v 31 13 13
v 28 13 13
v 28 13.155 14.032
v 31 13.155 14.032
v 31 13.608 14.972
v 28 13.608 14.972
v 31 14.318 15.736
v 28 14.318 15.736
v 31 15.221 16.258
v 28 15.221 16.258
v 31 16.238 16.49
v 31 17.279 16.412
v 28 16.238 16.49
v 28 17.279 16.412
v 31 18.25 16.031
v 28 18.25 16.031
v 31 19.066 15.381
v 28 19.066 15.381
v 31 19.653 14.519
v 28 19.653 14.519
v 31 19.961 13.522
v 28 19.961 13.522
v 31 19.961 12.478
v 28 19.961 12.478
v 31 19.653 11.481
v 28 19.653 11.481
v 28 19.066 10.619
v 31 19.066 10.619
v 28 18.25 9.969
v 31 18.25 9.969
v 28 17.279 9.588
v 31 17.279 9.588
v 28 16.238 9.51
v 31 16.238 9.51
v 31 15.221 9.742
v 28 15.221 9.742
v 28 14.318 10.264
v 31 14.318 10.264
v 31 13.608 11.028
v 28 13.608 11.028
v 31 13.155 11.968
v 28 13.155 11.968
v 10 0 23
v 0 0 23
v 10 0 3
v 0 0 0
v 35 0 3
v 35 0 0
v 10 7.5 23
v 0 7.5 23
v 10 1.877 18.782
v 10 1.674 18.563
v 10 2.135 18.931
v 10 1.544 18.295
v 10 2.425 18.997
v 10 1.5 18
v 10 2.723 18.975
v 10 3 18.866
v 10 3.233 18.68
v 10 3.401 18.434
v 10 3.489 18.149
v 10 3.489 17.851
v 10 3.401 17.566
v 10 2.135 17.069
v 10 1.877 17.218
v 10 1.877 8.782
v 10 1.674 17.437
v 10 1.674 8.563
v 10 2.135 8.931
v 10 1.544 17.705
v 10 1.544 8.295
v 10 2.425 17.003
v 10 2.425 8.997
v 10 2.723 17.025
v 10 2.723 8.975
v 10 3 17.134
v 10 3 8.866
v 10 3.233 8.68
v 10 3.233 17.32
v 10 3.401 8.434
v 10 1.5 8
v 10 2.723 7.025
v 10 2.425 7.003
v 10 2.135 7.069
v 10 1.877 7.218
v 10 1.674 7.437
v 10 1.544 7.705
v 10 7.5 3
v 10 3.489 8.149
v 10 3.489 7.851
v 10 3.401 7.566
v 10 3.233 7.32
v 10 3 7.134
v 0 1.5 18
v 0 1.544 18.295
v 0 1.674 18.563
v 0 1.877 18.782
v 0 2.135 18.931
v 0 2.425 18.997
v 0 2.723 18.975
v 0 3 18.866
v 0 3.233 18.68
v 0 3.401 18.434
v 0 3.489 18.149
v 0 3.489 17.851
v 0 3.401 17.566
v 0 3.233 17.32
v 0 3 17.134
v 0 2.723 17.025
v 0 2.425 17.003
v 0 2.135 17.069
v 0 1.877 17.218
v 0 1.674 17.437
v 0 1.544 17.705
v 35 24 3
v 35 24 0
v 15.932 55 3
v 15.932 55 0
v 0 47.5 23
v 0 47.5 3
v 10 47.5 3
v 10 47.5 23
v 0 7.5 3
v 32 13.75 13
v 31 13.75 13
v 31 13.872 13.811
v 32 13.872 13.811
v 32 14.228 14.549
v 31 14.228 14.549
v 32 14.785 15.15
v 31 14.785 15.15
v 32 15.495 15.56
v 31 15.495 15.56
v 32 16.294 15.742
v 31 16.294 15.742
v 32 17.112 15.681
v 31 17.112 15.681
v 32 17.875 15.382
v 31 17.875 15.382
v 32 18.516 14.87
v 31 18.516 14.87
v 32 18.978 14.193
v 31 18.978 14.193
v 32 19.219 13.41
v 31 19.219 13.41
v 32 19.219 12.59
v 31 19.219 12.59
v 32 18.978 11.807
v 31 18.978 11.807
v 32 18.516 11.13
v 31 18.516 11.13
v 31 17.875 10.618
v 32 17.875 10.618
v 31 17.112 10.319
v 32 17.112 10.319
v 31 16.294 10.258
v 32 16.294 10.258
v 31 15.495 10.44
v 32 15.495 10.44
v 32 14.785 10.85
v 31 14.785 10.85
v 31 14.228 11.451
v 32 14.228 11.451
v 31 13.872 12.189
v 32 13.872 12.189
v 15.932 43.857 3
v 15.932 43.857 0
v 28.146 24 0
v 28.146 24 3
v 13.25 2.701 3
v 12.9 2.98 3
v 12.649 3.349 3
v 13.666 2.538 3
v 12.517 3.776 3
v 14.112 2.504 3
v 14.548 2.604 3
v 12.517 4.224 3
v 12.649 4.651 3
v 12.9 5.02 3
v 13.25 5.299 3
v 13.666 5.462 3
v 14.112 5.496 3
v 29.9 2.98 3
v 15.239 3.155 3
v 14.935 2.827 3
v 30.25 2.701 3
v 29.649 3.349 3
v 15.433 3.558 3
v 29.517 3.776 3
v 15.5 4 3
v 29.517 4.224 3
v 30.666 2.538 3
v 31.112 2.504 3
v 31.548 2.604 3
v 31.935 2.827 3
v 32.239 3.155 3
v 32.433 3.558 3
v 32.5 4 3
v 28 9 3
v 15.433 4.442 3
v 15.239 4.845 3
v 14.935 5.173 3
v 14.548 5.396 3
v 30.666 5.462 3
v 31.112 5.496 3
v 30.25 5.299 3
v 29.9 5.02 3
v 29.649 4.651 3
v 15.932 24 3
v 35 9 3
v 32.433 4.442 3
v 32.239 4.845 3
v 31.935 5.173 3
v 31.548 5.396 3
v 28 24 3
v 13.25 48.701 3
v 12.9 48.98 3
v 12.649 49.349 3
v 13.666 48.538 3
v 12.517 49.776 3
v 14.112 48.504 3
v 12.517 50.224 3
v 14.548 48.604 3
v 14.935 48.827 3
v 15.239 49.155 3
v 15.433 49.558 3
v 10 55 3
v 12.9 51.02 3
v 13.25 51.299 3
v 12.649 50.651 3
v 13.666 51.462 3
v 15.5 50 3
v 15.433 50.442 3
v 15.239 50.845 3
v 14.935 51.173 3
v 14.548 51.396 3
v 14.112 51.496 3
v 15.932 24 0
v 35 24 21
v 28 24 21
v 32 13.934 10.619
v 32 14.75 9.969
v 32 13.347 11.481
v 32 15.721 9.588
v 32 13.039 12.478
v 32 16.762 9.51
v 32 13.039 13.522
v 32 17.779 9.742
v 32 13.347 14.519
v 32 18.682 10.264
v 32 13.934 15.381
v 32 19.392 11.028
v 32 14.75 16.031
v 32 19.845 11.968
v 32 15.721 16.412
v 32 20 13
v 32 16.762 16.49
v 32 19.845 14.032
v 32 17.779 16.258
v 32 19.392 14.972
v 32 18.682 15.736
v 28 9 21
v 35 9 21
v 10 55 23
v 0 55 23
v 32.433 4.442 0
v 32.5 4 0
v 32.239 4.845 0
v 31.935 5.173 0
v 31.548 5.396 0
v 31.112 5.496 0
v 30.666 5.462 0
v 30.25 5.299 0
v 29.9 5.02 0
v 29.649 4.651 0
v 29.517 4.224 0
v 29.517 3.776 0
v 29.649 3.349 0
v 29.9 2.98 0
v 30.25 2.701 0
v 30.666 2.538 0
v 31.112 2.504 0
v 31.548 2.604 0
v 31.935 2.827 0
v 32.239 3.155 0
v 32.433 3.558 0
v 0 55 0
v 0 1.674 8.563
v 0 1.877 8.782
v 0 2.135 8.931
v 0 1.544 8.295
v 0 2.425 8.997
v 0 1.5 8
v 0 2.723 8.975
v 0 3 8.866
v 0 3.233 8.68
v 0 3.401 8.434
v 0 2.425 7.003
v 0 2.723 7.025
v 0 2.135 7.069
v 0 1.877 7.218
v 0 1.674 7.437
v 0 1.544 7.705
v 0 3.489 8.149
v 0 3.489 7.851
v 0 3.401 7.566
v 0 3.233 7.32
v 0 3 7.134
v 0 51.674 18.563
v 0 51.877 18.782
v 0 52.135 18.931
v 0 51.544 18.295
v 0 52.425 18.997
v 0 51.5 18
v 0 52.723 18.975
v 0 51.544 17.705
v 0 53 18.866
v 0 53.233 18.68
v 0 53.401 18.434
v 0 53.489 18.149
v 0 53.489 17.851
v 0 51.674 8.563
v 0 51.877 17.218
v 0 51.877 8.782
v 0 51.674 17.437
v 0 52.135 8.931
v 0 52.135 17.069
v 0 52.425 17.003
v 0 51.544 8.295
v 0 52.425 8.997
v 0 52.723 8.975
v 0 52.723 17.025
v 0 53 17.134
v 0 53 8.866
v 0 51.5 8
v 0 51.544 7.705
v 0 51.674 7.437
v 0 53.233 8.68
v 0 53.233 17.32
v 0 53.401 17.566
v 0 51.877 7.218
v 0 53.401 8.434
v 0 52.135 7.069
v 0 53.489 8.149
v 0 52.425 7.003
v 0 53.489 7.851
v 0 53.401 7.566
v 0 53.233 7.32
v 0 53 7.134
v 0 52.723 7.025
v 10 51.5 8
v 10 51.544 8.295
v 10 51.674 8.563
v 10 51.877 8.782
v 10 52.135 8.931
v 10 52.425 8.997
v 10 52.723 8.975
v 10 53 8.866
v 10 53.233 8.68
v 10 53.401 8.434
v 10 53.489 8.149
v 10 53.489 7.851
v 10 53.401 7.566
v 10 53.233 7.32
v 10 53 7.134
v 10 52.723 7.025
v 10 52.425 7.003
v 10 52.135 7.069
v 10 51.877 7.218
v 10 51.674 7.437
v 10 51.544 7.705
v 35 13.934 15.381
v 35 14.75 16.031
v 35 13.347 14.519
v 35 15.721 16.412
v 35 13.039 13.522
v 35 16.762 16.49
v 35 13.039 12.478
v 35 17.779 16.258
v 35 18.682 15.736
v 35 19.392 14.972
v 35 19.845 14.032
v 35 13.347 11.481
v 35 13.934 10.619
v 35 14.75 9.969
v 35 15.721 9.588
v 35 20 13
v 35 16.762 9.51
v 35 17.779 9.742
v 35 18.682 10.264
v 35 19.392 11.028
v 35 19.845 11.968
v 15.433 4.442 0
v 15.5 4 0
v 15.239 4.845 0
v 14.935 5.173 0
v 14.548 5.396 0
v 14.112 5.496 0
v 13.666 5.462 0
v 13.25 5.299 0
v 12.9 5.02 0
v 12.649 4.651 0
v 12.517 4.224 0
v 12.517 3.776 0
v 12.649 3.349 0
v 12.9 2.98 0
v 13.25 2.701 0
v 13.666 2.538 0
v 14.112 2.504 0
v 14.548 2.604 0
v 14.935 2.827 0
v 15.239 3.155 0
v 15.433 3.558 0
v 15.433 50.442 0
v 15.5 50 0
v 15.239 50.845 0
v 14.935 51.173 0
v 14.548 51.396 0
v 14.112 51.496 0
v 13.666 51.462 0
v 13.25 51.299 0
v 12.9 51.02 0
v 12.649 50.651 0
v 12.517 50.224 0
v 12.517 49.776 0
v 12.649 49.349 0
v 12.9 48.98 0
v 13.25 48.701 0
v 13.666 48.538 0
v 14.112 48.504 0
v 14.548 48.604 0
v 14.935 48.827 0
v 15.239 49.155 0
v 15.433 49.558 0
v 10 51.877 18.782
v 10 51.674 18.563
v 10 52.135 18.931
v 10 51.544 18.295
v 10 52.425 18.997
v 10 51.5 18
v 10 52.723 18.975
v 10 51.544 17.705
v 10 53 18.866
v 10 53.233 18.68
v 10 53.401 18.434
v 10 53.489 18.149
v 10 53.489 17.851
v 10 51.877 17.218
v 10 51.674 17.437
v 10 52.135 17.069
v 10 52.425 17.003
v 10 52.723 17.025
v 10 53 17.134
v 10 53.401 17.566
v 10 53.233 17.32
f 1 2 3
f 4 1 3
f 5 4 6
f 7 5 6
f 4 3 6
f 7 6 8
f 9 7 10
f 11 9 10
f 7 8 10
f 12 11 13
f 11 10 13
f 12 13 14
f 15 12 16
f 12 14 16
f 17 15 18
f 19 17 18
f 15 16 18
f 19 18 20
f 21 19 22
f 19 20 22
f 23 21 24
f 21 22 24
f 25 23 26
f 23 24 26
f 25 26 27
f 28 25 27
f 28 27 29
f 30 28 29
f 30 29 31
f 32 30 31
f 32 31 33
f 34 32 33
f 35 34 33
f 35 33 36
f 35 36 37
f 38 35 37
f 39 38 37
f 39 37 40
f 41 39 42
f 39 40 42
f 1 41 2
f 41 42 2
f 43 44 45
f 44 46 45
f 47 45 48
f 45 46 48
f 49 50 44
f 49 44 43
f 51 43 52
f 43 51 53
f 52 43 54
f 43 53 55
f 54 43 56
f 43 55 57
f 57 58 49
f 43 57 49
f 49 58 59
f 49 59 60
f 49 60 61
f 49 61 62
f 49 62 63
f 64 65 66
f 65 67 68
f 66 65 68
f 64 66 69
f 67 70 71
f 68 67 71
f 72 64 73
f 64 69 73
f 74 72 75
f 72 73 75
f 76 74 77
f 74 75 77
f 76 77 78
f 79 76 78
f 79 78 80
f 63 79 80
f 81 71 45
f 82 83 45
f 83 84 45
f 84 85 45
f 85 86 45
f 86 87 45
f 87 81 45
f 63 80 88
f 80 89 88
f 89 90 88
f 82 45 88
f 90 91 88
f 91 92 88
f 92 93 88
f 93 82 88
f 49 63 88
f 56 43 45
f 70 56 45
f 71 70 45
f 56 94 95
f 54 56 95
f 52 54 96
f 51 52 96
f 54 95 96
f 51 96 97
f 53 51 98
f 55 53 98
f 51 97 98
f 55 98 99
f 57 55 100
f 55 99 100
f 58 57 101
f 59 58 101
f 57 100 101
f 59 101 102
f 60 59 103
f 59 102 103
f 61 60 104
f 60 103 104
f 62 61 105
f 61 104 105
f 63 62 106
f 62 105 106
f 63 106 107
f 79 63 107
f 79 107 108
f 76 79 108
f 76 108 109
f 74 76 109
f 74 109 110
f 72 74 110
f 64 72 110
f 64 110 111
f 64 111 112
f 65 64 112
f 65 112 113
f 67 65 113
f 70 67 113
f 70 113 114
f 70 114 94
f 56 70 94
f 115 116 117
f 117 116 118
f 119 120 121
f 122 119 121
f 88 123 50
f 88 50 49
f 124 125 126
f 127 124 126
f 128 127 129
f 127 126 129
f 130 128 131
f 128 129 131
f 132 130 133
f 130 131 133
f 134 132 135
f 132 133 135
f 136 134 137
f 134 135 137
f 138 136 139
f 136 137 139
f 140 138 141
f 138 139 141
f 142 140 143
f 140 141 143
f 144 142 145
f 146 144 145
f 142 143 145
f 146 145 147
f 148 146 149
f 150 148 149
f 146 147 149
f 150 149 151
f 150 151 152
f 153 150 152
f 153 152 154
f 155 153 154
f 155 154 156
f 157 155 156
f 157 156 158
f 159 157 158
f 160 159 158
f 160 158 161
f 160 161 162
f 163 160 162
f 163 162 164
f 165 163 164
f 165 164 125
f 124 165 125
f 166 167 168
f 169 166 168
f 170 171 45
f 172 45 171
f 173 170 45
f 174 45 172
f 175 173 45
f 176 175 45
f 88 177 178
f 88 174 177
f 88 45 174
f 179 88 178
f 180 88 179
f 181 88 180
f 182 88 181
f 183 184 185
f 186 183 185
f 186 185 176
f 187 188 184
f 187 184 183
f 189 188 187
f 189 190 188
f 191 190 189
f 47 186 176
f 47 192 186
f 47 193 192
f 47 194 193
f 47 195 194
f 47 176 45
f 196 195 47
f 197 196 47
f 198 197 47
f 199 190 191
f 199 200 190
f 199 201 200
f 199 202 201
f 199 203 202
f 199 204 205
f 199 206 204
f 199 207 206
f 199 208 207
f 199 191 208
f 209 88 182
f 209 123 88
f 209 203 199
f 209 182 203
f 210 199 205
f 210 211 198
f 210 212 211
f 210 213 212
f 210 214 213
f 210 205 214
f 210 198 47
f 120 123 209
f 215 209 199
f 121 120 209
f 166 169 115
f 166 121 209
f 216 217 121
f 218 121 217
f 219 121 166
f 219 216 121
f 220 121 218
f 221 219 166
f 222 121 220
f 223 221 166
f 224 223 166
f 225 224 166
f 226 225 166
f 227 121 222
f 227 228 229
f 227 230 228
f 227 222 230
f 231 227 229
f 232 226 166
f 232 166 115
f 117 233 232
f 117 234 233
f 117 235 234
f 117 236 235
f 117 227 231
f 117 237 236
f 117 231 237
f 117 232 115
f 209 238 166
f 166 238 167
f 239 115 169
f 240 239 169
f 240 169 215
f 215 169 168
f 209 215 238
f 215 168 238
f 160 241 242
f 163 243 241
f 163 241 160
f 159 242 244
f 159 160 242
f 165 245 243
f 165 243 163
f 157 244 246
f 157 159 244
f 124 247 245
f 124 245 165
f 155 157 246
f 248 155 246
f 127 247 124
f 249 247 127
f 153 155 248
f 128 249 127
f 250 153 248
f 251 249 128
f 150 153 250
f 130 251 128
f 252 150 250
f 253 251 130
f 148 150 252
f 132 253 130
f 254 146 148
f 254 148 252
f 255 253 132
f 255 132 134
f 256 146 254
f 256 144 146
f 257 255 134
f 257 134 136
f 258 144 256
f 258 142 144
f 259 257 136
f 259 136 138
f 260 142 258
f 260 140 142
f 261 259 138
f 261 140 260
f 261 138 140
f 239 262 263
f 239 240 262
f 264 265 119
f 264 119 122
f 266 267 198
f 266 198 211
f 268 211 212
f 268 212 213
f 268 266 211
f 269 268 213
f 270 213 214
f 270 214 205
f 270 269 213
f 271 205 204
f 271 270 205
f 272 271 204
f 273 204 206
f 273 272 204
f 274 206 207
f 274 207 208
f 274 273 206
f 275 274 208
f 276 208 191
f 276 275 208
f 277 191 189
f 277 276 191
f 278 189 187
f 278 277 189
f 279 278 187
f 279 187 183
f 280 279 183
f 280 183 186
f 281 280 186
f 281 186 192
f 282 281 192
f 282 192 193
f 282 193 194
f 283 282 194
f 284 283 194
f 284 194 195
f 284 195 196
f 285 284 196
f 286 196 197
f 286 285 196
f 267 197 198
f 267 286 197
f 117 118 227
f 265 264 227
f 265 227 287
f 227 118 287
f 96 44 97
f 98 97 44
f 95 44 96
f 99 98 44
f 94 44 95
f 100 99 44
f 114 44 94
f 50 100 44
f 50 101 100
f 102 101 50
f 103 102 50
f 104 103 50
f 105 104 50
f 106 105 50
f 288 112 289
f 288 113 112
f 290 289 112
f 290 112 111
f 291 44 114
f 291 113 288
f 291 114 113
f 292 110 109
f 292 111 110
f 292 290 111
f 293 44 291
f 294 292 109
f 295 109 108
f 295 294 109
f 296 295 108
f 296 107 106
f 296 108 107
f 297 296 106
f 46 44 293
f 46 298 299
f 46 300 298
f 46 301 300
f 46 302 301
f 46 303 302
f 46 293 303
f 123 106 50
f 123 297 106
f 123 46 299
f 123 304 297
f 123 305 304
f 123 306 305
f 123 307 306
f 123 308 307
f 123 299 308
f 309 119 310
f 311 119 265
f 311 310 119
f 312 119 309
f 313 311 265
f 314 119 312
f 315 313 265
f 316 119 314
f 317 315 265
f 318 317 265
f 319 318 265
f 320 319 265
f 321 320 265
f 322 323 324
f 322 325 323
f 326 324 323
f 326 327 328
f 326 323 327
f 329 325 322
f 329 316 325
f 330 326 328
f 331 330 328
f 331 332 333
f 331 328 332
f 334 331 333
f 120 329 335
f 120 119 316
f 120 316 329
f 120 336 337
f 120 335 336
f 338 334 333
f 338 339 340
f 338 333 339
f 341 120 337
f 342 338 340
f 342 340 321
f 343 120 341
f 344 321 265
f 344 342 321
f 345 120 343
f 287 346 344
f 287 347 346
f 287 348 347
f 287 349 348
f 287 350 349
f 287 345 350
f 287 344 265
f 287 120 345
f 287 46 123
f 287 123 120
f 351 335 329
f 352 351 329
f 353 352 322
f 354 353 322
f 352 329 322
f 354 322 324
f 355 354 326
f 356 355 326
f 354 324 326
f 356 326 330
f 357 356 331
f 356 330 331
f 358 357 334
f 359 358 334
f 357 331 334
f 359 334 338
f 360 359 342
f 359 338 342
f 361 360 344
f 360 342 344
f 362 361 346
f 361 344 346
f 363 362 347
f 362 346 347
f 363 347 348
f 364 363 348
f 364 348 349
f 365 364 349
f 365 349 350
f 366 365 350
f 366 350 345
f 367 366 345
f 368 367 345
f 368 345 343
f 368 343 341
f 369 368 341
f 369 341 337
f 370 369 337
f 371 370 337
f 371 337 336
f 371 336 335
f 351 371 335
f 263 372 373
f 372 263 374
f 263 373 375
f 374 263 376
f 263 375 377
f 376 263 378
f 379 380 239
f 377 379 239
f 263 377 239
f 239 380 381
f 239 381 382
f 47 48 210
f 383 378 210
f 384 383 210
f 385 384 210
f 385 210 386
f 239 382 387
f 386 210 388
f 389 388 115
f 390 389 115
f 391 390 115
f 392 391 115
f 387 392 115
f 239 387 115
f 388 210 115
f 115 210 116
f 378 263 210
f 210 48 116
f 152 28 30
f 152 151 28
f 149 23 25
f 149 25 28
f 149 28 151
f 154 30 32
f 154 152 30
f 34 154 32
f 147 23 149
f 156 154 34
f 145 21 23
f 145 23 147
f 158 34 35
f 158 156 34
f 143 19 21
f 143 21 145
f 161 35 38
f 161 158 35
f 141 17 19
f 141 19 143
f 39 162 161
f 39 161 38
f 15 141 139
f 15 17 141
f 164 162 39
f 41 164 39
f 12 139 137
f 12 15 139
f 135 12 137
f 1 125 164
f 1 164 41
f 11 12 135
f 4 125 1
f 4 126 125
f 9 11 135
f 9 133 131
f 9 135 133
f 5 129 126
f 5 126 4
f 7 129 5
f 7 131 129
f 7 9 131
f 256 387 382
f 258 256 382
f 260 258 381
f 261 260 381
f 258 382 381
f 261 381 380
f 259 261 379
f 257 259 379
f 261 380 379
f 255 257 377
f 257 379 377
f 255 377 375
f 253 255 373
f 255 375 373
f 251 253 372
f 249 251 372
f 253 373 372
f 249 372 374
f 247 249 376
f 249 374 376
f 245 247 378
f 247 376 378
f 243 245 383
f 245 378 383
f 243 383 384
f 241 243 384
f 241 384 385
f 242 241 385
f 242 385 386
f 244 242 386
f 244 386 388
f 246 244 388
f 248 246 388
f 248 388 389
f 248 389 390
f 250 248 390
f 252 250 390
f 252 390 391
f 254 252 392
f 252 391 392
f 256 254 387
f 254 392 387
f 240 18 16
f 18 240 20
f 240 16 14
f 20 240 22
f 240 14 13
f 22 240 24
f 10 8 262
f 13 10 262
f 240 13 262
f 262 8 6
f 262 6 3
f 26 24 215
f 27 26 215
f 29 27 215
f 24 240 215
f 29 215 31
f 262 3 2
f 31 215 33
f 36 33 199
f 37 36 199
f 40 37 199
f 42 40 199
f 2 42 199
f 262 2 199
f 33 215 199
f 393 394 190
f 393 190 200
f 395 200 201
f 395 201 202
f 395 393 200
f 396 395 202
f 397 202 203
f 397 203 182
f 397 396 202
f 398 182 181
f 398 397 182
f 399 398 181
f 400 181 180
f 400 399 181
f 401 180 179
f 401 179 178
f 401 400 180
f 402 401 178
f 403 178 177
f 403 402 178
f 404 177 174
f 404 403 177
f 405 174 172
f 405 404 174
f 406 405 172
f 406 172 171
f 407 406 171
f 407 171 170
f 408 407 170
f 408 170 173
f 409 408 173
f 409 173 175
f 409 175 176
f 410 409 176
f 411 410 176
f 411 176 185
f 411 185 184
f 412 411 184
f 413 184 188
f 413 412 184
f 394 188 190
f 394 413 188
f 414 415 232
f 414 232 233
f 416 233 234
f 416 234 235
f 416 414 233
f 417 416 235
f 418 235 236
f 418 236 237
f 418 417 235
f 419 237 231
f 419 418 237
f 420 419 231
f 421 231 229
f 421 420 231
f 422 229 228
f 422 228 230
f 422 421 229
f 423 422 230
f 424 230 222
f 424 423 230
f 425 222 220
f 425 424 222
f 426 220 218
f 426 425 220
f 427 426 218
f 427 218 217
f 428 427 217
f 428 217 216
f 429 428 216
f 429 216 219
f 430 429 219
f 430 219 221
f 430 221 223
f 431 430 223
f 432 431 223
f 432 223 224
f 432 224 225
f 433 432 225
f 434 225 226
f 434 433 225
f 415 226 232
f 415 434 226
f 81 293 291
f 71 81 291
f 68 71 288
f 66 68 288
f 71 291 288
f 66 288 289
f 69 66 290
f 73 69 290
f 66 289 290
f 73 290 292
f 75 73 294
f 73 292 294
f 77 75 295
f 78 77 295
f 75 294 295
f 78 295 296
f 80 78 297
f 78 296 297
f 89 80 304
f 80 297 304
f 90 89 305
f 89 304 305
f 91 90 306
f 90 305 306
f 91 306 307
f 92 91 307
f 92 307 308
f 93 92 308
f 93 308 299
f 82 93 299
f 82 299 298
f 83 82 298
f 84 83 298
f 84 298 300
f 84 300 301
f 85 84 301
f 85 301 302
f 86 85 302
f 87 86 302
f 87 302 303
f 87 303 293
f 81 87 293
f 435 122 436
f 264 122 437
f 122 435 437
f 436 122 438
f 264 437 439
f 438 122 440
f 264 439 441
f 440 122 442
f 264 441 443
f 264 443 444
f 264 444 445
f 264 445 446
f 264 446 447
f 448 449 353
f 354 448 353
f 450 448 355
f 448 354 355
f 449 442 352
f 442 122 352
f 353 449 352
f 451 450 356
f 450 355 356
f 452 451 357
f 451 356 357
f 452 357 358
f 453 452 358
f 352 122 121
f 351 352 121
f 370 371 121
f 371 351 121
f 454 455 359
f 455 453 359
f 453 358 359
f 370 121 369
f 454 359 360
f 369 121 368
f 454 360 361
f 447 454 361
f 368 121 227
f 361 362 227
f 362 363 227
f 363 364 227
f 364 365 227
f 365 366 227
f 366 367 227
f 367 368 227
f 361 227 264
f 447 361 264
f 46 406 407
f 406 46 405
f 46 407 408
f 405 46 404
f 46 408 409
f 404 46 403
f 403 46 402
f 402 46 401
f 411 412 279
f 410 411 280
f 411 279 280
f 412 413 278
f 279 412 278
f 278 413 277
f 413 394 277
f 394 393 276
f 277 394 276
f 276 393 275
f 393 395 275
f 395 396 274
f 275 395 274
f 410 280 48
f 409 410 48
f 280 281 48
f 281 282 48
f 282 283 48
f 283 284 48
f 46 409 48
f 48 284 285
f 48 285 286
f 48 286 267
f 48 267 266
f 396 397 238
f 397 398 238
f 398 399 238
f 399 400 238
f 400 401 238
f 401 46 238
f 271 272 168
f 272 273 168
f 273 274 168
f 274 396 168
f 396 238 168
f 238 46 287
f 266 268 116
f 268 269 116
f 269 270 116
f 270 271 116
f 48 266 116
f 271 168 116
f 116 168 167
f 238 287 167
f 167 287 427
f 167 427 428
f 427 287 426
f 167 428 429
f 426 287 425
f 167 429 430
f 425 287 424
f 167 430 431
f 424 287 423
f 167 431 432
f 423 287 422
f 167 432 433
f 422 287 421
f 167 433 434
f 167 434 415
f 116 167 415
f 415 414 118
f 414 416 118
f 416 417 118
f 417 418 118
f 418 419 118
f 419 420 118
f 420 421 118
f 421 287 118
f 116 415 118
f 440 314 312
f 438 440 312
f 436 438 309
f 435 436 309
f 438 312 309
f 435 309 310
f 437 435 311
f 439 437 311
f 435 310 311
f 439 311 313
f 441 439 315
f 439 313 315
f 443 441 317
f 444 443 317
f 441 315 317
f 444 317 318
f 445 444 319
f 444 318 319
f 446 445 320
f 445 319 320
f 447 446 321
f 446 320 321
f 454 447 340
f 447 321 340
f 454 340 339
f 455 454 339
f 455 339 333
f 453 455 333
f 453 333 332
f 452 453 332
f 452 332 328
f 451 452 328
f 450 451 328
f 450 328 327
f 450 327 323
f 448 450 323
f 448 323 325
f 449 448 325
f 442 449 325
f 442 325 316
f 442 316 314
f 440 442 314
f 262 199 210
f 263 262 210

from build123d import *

# Parameters (mm, degrees)
F0_R      = 1.5
F1_DEPTH  = 3
F3_DEPTH  = 18
F2_W      = 10
F2_H      = 7.5
F4_DEPTH  = 20
F5_R      = 3.5
F6_DEPTH  = 3
F7_R      = 2.75
F8_DEPTH  = 25
F9_R      = 1
F10_DEPTH = 25
F11_R     = 3.5
F12_DEPTH = 3


with BuildPart() as f1:
    # F0 (on Top) → F1 (new body)
    with BuildSketch(Plane.XY):
        Polygon((0, 55), (0, 0), (35, 0), (35, 24), (15.932095, 55), align=None)
        with Locations((14, 4)):
            Circle(F0_R, mode=Mode.SUBTRACT)
        with Locations((31, 4)):
            Circle(F0_R, mode=Mode.SUBTRACT)
        with Locations((14, 50)):
            Circle(F0_R, mode=Mode.SUBTRACT)
        Polygon((15.932095, 24), (15.932095, 43.857069), (28.146053, 24), align=None, mode=Mode.SUBTRACT)
    extrude(amount=F1_DEPTH)

    # F2 (on face) → F3 (join)
    with BuildSketch(Plane.XY.offset(3)):
        Polygon((28, 9), (35, 9), (35, 24), (28.146053, 24), (28, 24), align=None)
    extrude(amount=F3_DEPTH)

    # F2 (on face) → F4 (join)
    with BuildSketch(Plane.XY.offset(3)):
        with Locations((5, 3.75)):
            Rectangle(F2_W, F2_H)
        with Locations((5, 51.25)):
            Rectangle(F2_W, F2_H)
    extrude(amount=F4_DEPTH)

    # F5 (on face) → F6 (cut)
    with BuildSketch(Plane(origin=(28, 0, 0), x_dir=(0, -1, 0), z_dir=(-1, 0, 0))):
        with Locations((-16.5, 13)):
            Circle(F5_R)
    extrude(amount=-F6_DEPTH, mode=Mode.SUBTRACT)

    # F7 (on face) → F8 (cut)
    with BuildSketch(Plane(origin=(31, 0, 0), x_dir=(0, -1, 0), z_dir=(-1, 0, 0))):
        with Locations((-16.5, 13)):
            Circle(F7_R)
    extrude(amount=-F8_DEPTH, mode=Mode.SUBTRACT)

    # F9 (on face) → F10 (cut)
    with BuildSketch(Plane(origin=(0, 0, 0), x_dir=(0, -1, 0), z_dir=(-1, 0, 0))):
        with Locations((-2.5, 18)):
            Circle(F9_R)
        with Locations((-2.5, 8)):
            Circle(F9_R)
        with Locations((-52.5, 18)):
            Circle(F9_R)
        with Locations((-52.5, 8)):
            Circle(F9_R)
    extrude(amount=-F10_DEPTH, mode=Mode.SUBTRACT)

    # F11 (on face) → F12 (cut)
    with BuildSketch(Plane.YZ.offset(35)):
        with Locations((16.5, 13)):
            Circle(F11_R)
    extrude(amount=-F12_DEPTH, mode=Mode.SUBTRACT)


solid = f1.part
